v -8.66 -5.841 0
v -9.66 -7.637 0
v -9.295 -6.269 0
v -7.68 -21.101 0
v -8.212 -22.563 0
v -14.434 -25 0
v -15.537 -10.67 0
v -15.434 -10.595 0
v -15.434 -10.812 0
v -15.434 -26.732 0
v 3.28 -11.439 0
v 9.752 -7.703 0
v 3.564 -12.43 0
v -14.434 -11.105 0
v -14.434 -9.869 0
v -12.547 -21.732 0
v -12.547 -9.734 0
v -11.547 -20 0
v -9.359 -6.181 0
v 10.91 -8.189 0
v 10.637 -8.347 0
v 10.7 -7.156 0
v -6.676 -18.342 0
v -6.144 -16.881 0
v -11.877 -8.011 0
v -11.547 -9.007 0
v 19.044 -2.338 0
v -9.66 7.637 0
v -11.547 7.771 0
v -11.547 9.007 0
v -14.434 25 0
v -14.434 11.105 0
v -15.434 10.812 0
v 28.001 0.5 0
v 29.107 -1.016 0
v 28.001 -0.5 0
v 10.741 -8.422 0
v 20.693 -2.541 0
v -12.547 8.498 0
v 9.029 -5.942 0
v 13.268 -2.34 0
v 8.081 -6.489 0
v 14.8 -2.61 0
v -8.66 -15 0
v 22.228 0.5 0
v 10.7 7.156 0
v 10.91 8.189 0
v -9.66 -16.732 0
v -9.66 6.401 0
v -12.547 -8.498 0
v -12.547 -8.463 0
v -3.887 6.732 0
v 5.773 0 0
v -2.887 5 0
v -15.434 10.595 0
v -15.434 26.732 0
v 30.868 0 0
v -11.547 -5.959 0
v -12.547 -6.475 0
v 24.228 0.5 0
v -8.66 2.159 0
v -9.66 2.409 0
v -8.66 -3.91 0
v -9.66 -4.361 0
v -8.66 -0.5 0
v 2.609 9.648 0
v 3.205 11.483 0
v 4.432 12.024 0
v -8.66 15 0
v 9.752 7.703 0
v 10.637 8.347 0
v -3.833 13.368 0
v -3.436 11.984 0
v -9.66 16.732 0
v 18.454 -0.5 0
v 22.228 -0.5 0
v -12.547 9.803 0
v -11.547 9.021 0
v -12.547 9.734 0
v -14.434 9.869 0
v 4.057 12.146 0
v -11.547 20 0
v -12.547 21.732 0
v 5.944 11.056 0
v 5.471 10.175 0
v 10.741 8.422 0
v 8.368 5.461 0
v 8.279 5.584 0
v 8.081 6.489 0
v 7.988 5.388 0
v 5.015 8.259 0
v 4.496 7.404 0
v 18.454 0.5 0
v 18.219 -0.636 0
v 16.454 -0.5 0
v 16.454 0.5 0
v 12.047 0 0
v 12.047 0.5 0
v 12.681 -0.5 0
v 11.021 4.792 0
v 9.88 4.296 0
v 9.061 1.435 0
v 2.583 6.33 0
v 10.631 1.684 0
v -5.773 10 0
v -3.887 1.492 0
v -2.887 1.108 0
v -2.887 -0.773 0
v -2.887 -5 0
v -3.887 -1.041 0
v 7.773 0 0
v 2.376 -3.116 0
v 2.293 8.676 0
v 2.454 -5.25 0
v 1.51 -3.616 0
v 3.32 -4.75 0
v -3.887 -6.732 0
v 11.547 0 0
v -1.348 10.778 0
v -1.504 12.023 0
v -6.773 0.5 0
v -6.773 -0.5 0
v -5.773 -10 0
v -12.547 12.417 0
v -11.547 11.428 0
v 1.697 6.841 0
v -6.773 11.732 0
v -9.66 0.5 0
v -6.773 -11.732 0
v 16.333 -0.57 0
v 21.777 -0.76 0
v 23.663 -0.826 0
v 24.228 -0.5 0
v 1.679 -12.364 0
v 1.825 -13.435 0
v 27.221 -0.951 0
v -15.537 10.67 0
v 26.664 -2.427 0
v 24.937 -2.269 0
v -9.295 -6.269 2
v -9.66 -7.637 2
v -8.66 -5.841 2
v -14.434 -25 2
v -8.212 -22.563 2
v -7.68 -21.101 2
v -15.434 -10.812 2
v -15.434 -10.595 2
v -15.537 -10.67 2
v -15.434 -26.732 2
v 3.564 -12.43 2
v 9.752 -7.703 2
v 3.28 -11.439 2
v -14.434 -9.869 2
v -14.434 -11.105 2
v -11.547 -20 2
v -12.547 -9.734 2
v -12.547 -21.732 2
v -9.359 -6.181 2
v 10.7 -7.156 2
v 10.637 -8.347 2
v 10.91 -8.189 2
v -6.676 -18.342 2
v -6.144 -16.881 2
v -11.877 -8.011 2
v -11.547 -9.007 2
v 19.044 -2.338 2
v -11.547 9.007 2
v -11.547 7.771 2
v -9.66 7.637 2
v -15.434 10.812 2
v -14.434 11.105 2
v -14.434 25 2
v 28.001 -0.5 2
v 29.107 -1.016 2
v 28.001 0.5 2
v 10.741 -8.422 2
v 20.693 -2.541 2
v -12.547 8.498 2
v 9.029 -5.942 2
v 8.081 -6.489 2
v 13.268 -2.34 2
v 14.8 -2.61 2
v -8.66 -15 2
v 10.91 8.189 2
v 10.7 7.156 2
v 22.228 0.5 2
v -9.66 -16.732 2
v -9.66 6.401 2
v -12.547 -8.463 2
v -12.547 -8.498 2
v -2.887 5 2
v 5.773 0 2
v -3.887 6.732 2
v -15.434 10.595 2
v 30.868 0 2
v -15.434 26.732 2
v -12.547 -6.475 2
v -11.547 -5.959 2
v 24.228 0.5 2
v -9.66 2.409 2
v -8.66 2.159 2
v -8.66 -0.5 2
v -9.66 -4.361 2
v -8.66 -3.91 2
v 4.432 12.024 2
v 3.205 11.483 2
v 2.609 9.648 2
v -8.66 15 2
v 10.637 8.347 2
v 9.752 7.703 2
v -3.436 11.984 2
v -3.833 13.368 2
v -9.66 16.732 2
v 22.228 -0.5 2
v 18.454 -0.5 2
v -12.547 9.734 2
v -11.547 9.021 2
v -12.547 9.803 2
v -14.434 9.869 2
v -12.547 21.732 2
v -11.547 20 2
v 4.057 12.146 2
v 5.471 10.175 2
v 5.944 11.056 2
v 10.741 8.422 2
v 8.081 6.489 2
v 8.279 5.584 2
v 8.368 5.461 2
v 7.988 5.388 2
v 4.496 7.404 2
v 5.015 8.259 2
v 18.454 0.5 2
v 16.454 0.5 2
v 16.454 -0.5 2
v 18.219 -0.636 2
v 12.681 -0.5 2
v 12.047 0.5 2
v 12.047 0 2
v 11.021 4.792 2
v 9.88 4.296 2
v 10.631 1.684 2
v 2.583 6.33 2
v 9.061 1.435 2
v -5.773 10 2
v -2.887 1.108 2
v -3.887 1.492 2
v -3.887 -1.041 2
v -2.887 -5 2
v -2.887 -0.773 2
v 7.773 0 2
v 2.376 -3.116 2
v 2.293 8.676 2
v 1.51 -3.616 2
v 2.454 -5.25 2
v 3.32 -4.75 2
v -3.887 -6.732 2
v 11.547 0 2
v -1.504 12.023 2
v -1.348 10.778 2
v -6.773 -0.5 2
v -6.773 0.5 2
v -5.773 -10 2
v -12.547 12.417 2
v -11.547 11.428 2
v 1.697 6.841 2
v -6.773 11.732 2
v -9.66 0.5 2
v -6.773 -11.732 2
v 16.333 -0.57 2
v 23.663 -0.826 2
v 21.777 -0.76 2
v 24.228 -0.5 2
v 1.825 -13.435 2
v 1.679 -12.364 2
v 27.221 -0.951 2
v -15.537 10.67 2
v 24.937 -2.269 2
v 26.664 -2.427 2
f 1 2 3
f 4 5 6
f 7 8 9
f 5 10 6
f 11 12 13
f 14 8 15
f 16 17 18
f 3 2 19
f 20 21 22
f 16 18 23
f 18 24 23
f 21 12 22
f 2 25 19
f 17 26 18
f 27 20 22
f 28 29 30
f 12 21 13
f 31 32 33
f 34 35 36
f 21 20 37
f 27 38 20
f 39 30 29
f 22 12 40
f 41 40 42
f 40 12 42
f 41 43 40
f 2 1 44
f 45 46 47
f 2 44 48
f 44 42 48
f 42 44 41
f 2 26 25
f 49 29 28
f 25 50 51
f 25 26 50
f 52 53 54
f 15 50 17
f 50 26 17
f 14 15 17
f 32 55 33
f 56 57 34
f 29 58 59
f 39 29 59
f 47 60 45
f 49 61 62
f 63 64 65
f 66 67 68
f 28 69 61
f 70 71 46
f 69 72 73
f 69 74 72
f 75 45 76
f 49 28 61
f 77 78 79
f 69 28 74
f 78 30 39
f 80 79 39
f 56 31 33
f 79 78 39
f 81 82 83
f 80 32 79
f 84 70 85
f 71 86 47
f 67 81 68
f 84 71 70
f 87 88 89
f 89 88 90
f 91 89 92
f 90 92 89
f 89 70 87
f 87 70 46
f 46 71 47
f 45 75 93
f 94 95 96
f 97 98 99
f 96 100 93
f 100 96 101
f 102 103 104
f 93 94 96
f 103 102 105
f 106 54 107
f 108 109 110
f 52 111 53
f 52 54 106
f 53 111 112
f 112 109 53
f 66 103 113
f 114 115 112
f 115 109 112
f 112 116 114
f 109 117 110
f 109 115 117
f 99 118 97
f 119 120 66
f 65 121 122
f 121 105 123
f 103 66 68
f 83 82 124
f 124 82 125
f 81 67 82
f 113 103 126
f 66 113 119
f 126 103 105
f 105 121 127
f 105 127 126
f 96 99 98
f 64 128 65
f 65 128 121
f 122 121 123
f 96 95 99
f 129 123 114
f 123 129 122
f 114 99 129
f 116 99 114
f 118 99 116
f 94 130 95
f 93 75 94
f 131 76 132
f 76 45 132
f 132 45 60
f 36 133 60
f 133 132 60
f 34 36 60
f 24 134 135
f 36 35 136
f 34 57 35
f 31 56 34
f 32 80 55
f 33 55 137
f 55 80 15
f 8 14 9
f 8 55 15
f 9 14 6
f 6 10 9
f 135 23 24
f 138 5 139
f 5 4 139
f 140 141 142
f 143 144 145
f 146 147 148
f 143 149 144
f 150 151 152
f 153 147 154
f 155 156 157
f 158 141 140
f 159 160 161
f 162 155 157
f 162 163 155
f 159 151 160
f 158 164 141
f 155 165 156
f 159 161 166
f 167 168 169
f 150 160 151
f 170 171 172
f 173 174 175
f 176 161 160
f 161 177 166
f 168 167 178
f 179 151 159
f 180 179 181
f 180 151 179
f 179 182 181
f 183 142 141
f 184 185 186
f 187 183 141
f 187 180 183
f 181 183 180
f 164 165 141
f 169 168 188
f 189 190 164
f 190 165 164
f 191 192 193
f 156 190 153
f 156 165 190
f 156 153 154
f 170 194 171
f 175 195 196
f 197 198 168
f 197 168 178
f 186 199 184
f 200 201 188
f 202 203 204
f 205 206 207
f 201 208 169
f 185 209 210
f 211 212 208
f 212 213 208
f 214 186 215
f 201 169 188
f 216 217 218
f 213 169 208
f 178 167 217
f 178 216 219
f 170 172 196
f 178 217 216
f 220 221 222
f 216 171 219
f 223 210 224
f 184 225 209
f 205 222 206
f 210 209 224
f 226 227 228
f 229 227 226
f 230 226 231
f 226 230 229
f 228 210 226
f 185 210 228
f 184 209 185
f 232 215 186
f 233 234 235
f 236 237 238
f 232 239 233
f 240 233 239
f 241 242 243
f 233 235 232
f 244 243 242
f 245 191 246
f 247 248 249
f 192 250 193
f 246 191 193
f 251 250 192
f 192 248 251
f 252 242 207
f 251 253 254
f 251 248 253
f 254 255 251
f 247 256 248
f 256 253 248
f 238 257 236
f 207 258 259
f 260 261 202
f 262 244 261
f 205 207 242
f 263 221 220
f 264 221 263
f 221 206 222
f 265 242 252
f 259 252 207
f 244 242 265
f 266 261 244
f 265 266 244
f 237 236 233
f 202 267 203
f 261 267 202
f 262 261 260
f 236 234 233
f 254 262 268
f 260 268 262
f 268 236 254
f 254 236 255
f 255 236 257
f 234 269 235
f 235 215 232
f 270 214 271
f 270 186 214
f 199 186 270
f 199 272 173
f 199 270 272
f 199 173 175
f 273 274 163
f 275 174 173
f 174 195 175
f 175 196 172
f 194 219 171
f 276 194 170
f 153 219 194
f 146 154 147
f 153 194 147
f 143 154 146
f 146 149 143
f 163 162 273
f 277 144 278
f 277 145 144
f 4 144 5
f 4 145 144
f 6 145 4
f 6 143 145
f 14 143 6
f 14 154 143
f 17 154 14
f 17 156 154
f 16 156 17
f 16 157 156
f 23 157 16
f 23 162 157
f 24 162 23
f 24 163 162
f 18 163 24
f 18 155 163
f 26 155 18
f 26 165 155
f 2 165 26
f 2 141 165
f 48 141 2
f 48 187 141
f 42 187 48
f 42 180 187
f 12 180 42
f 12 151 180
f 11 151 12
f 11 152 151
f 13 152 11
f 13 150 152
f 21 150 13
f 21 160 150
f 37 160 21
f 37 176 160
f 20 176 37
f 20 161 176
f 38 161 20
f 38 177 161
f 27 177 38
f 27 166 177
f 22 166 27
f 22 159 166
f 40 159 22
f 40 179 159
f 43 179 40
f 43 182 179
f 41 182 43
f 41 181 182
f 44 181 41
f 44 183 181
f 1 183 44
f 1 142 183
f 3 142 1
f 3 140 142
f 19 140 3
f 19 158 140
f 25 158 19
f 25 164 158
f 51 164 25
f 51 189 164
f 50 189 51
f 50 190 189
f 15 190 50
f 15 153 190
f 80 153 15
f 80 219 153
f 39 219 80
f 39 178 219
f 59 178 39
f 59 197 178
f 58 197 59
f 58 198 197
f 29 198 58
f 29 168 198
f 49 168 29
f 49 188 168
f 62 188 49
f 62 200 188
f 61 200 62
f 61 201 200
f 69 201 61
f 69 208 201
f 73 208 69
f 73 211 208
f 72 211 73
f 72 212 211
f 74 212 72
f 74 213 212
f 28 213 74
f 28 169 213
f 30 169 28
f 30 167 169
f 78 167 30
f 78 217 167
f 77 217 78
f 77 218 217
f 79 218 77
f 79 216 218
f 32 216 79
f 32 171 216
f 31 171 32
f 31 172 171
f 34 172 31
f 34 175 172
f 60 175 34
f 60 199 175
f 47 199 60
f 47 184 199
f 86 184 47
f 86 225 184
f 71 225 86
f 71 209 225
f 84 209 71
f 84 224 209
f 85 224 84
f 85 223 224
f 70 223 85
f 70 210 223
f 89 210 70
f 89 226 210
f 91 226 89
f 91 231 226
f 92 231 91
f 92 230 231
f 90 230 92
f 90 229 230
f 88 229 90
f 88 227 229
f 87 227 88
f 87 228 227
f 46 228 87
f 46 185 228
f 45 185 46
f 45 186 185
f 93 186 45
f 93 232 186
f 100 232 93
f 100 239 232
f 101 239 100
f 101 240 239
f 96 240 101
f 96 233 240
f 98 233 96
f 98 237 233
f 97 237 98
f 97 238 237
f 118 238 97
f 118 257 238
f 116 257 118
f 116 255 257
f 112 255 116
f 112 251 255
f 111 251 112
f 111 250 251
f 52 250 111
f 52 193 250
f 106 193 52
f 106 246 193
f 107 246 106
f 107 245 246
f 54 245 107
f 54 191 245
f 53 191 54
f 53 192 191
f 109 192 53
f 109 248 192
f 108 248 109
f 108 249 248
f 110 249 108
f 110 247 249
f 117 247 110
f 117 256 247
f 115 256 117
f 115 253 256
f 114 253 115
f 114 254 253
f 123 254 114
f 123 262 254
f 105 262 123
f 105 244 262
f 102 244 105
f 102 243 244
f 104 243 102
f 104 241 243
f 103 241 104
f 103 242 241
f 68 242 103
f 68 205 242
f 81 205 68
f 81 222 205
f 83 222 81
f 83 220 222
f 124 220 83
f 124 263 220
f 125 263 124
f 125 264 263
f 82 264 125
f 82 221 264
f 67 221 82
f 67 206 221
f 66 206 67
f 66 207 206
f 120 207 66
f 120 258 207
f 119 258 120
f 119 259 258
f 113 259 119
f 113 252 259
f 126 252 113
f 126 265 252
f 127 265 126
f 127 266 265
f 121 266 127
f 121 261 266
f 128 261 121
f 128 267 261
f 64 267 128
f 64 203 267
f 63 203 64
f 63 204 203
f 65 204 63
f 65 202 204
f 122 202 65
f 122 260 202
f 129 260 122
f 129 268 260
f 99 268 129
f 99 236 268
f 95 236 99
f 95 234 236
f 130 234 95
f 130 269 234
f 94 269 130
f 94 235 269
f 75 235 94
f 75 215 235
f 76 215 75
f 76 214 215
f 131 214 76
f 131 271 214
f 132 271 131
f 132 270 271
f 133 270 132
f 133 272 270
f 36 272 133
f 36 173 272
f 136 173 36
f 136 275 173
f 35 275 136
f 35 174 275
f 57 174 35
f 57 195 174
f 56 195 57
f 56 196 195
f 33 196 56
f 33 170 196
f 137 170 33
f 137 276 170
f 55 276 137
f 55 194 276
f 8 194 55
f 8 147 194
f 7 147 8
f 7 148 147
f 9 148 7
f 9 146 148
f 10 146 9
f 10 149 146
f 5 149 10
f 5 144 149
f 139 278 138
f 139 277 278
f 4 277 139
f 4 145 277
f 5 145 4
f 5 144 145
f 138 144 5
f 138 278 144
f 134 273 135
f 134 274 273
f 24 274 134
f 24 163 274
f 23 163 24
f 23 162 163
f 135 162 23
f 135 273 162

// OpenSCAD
side_length = 50; 

wall_thickness = 1;
wall_height = 2;

cblocks = 10;  
levels = 5; 

/*
 * constants, for clearness
 *
 */
 
// random directions, for picking up a direction to visit the next block
function PERMUTATION_OF_FOUR() = [
    [1, 2, 3, 4],
    [1, 2, 4, 3],
    [1, 3, 2, 4],
    [1, 3, 4, 2],
    [1, 4, 2, 3],
    [1, 4, 3, 2],
    [2, 1, 3, 4],
    [2, 1, 4, 3],
    [2, 3, 1, 4],
    [2, 3, 4, 1],
    [2, 4, 1, 3],
    [2, 4, 3, 1],
    [3, 1, 2, 4],
    [3, 1, 4, 2],
    [3, 2, 1, 4],
    [3, 2, 4, 1],
    [3, 4, 1, 2],
    [3, 4, 2, 1],
    [4, 1, 2, 3],
    [4, 1, 3, 2],
    [4, 2, 1, 3],
    [4, 2, 3, 1],
    [4, 3, 1, 2],
    [4, 3, 2, 1]
];

function NO_WALL() = 0;
function UP_WALL() = 1;
function RIGHT_WALL() = 2;
function UP_RIGHT_WALL() = 3;

function NOT_VISITED() = 0;
function VISITED() = 1;

/* 
 * modules for creating a maze
 *
 */

function PI() = 3.14159;



/* 
 * utilities functions
 *
 */

// comare the equality of [x1, y1] and [x2, y2]
function cord_equals(cord1, cord2) = cord1 == cord2;

// is the point visited?
function not_visited(cord, vs, index = 0) =
    index == len(vs) ? true : 
        (cord_equals([vs[index][0], vs[index][1]], cord) && vs[index][2] == 1 ? false :
            not_visited(cord, vs, index + 1));
            
// pick a direction randomly
function rand_dirs() =
    PERMUTATION_OF_FOUR()[round(rands(0, 24, 1)[0])]; 

// replace v1 in the vector with v2 
function replace(v1, v2, vs) =
    [for(i = [0:len(vs) - 1]) vs[i] == v1 ? v2 : vs[i]];
    
/* 
 * functions for generating a maze vector
 *
 */

// initialize a maze
function init_maze(rows, columns) = 
    [
	    for(c = [1 : columns]) 
	        for(r = [1 : rows]) 
		        [c, r, 0,  UP_RIGHT_WALL()]
	];
    
// find a vector in the maze vector
function find(i, j, maze_vector, index = 0) =
    index == len(maze_vector) ? [] : (
        cord_equals([i, j], [maze_vector[index][0], maze_vector[index][1]]) ? maze_vector[index] : find(i, j, maze_vector, index + 1)
    );

////
// NO_WALL = 0;
// UP_WALL = 1;
// RIGHT_WALL = 2;
// UP_RIGHT_WALL = 3;
function delete_right_wall(original_block) = 
    original_block == NO_WALL() || original_block == RIGHT_WALL() ? NO_WALL() : UP_WALL();

function delete_up_wall(original_block) = 
    (original_block == NO_WALL() || original_block == UP_WALL()) ? NO_WALL() : RIGHT_WALL();
    
function delete_right_wall_of(vs, is_visited, maze_vector) =
    replace(vs, [vs[0], vs[1] , is_visited, delete_right_wall(vs[3])] ,maze_vector);

function delete_up_wall_of(vs, is_visited, maze_vector) =
    replace(vs, [vs[0], vs[1] , is_visited, delete_up_wall(vs[3])] ,maze_vector);

function go_right(i, j, rows, columns, maze_vector) =
    go_maze(i + 1, j, rows, columns, delete_right_wall_of(find(i, j, maze_vector), VISITED(), maze_vector));
    
function go_up(i, j, rows, columns, maze_vector) =
    go_maze(i, j - 1, rows, columns, delete_up_wall_of(find(i, j, maze_vector), VISITED(), maze_vector));
    
function visit(v, maze_vector) =
    replace(v, [v[0], v[1], VISITED(), v[3]], maze_vector);
 
function go_left(i, j, rows, columns, maze_vector) =
    go_maze(i - 1, j, rows, columns, delete_right_wall_of(find(i - 1, j, maze_vector), NOT_VISITED(), maze_vector));
    
function go_down(i, j, rows, columns, maze_vector) =
    go_maze(i, j + 1, rows, columns, delete_up_wall_of(find(i, j + 1, maze_vector), NOT_VISITED(), maze_vector));
    
function go_maze(i, j, rows, columns, maze_vector) =
    look_around(i, j, rand_dirs(), rows, columns, visit(find(i, j, maze_vector), maze_vector));
    
function look_around(i, j, dirs, rows, columns, maze_vector, index = 0) =
    index == 4 ? maze_vector : 
        look_around( 
            i, j, dirs, 
            rows, columns, 
            build_wall(i, j, dirs[index], rows, columns, maze_vector), 
            index + 1
        ); 

function build_wall(i, j, n, rows, columns, maze_vector) = 
    n == 1 && i != columns && not_visited([i + 1, j], maze_vector) ? go_right(i, j, rows, columns, maze_vector) : ( 
        n == 2 && j != 1 && not_visited([i, j - 1], maze_vector) ? go_up(i, j, rows, columns, maze_vector)  : (
            n == 3 && i != 1 && not_visited([i - 1, j], maze_vector) ? go_left(i, j,rows, columns,  maze_vector)  : (
                n == 4 && j != rows && not_visited([i, j + 1], maze_vector) ? go_down(i, j, rows, columns, maze_vector) : maze_vector
            ) 
        )
    ); 

// give a [x, y] point and length. draw a line in the x direction
module x_line(point, length, thickness = 1) {
    offset = thickness / 2;
    translate([point[0] - offset, point[1] - offset, 0]) 
        square([length + thickness, thickness]);
}

// create a equilateral triangle
module equilateral_triangle(side_length, center = false) {
    radius = 0.57735026918962576450914878050196 * side_length;
	circle(r = radius, center = center, $fn = 3); 
}

// create a holly equilateral triangle
module holly_equilateral_triangle(side_length, thickness = 1, center = true) {
    difference() {
	    offset(delta = thickness) equilateral_triangle(side_length, center = center);
	    equilateral_triangle(side_length, center = center);
    }
}

// Given a side length of a equilateral triangle, return the length of incenter to vertex.
function triangle_incenter_to_vertex_length(triangle_side_length) = 0.57735026918962576450914878050196 * triangle_side_length;

// used by `sector_cutter` module. Accepted angle is from 0 to 90 degree.
module a_quarter_sector_cutter(radius, angle) {
    outer = radius;
    polygon([[0, 0], [outer, 0], [outer, outer * sin(angle)], [outer * cos(angle), outer * sin(angle)]]);
}

// userd by `holly_equilateral_triangle_sector` for difference
module sector_cutter(radius, angles) {
    angle_from = angles[0];
    angle_to = angles[1];
    angle_difference = angle_to - angle_from;
    
    rotate(angle_from)
        if(angle_difference <= 90) {
            a_quarter_sector_cutter(radius, angle_difference);
        } else if(angle_difference > 90 && angle_difference <= 180) {
            sector_cutter(radius, [0, 90]);
            rotate(90) a_quarter_sector_cutter(radius, angle_difference - 90);
        } else if(angle_difference > 180 && angle_difference <= 270) {
            sector_cutter(radius, [0, 180]);
            rotate(180) a_quarter_sector_cutter(radius, angle_difference - 180);
        } else if(angle_difference > 270 && angle_difference <= 360) {
            sector_cutter(radius, [0, 270]);
            rotate(270) a_quarter_sector_cutter(radius, angle_difference - 270);
       }
}

// For a triangle, a different angle has a different length from incenter to its side.
function triangle_incenter_to_side_length(incenter_to_vertex_length, angle) = 
    (angle >= 0 && angle <= 60) ? 0.5 * incenter_to_vertex_length / cos(angle) : (
	    (angle > 60 && angle <= 120) ? triangle_incenter_to_side_length(incenter_to_vertex_length, 120 - angle) : triangle_incenter_to_side_length(incenter_to_vertex_length, angle - 120)
	);

// draw a line from incenter to side for a equilateral triangle
module triangle_incenter_to_side_line(side_length, angle, incenter_to_side_blocks, level, thickness = 1) {
    block_length = triangle_incenter_to_side_length(triangle_incenter_to_vertex_length(side_length), angle + 60) / incenter_to_side_blocks ;
	
	rotate([0, 0, angle]) 
	    translate([block_length * (level - 1) + thickness, 0, 0])
		    x_line([0, 0], block_length - thickness / 2, thickness);
}

// draw a side between `angles[0]` and `angles[1]`
module holly_equilateral_triangle_sector(side_length, angles, thickness = 1) {
	intersection() {
        holly_equilateral_triangle(side_length, thickness);
	    sector_cutter(triangle_incenter_to_vertex_length(side_length) + thickness * 2, [angles[0], angles[1]]);
	}
}


module triangle_maze(side_length, cblocks, levels, thickness = 1) {
    full_circle_angle = 360;
    arc_angle = full_circle_angle / cblocks;
	incenter_to_side_blocks = levels - 2;
	
	divided_side_length = side_length / levels;
	
	maze = go_maze(1, 1, cblocks, incenter_to_side_blocks, replace([incenter_to_side_blocks, cblocks, 0, UP_RIGHT_WALL()], [incenter_to_side_blocks, cblocks, 0, UP_WALL()], init_maze(cblocks, incenter_to_side_blocks)));
	  
	// maze
    for(i = [0:len(maze) - 1]) { 
        cord = maze[i];
		cr = cord[0]; 
		cc = cord[1] - 1;    
        v = cord[3];
        
		angle = cc * arc_angle;
		
        if(v == 1 || v == 3) {
			triangle_incenter_to_side_line(side_length, angle, levels, cr + 2, thickness);
        } 
		
        if(v == 2 || v == 3) {
		    sl = divided_side_length * (cr + 2);
			offset_angle = angle - arc_angle / 18;
			
			holly_equilateral_triangle_sector(sl, [offset_angle,  offset_angle + arc_angle], thickness);   
        } 
		
		if(v == 0 || v == 1) {
		    sl = divided_side_length * (cr + 2);		
			factor = abs((arc_angle * (cc + 1)) % 120 - 60) / 60; 
			offset_angle = angle - arc_angle / 18;
			
			holly_equilateral_triangle_sector(sl, [offset_angle, offset_angle + arc_angle * (sl - divided_side_length + factor) / (sl - factor * (cr + 2))], thickness);    
		}		
	}
	
	// inner triangle
	rotate([0, 0, 240]) 
		holly_equilateral_triangle_sector(divided_side_length, [-45, 315 - arc_angle], thickness);
	
	triangle_incenter_to_side_line(side_length, 300, levels, 2, thickness = 1);

	holly_equilateral_triangle_sector(divided_side_length * 2, [arc_angle / 4, 360], thickness);
}

linear_extrude(wall_height) 
    triangle_maze(side_length, cblocks, levels, wall_thickness);
